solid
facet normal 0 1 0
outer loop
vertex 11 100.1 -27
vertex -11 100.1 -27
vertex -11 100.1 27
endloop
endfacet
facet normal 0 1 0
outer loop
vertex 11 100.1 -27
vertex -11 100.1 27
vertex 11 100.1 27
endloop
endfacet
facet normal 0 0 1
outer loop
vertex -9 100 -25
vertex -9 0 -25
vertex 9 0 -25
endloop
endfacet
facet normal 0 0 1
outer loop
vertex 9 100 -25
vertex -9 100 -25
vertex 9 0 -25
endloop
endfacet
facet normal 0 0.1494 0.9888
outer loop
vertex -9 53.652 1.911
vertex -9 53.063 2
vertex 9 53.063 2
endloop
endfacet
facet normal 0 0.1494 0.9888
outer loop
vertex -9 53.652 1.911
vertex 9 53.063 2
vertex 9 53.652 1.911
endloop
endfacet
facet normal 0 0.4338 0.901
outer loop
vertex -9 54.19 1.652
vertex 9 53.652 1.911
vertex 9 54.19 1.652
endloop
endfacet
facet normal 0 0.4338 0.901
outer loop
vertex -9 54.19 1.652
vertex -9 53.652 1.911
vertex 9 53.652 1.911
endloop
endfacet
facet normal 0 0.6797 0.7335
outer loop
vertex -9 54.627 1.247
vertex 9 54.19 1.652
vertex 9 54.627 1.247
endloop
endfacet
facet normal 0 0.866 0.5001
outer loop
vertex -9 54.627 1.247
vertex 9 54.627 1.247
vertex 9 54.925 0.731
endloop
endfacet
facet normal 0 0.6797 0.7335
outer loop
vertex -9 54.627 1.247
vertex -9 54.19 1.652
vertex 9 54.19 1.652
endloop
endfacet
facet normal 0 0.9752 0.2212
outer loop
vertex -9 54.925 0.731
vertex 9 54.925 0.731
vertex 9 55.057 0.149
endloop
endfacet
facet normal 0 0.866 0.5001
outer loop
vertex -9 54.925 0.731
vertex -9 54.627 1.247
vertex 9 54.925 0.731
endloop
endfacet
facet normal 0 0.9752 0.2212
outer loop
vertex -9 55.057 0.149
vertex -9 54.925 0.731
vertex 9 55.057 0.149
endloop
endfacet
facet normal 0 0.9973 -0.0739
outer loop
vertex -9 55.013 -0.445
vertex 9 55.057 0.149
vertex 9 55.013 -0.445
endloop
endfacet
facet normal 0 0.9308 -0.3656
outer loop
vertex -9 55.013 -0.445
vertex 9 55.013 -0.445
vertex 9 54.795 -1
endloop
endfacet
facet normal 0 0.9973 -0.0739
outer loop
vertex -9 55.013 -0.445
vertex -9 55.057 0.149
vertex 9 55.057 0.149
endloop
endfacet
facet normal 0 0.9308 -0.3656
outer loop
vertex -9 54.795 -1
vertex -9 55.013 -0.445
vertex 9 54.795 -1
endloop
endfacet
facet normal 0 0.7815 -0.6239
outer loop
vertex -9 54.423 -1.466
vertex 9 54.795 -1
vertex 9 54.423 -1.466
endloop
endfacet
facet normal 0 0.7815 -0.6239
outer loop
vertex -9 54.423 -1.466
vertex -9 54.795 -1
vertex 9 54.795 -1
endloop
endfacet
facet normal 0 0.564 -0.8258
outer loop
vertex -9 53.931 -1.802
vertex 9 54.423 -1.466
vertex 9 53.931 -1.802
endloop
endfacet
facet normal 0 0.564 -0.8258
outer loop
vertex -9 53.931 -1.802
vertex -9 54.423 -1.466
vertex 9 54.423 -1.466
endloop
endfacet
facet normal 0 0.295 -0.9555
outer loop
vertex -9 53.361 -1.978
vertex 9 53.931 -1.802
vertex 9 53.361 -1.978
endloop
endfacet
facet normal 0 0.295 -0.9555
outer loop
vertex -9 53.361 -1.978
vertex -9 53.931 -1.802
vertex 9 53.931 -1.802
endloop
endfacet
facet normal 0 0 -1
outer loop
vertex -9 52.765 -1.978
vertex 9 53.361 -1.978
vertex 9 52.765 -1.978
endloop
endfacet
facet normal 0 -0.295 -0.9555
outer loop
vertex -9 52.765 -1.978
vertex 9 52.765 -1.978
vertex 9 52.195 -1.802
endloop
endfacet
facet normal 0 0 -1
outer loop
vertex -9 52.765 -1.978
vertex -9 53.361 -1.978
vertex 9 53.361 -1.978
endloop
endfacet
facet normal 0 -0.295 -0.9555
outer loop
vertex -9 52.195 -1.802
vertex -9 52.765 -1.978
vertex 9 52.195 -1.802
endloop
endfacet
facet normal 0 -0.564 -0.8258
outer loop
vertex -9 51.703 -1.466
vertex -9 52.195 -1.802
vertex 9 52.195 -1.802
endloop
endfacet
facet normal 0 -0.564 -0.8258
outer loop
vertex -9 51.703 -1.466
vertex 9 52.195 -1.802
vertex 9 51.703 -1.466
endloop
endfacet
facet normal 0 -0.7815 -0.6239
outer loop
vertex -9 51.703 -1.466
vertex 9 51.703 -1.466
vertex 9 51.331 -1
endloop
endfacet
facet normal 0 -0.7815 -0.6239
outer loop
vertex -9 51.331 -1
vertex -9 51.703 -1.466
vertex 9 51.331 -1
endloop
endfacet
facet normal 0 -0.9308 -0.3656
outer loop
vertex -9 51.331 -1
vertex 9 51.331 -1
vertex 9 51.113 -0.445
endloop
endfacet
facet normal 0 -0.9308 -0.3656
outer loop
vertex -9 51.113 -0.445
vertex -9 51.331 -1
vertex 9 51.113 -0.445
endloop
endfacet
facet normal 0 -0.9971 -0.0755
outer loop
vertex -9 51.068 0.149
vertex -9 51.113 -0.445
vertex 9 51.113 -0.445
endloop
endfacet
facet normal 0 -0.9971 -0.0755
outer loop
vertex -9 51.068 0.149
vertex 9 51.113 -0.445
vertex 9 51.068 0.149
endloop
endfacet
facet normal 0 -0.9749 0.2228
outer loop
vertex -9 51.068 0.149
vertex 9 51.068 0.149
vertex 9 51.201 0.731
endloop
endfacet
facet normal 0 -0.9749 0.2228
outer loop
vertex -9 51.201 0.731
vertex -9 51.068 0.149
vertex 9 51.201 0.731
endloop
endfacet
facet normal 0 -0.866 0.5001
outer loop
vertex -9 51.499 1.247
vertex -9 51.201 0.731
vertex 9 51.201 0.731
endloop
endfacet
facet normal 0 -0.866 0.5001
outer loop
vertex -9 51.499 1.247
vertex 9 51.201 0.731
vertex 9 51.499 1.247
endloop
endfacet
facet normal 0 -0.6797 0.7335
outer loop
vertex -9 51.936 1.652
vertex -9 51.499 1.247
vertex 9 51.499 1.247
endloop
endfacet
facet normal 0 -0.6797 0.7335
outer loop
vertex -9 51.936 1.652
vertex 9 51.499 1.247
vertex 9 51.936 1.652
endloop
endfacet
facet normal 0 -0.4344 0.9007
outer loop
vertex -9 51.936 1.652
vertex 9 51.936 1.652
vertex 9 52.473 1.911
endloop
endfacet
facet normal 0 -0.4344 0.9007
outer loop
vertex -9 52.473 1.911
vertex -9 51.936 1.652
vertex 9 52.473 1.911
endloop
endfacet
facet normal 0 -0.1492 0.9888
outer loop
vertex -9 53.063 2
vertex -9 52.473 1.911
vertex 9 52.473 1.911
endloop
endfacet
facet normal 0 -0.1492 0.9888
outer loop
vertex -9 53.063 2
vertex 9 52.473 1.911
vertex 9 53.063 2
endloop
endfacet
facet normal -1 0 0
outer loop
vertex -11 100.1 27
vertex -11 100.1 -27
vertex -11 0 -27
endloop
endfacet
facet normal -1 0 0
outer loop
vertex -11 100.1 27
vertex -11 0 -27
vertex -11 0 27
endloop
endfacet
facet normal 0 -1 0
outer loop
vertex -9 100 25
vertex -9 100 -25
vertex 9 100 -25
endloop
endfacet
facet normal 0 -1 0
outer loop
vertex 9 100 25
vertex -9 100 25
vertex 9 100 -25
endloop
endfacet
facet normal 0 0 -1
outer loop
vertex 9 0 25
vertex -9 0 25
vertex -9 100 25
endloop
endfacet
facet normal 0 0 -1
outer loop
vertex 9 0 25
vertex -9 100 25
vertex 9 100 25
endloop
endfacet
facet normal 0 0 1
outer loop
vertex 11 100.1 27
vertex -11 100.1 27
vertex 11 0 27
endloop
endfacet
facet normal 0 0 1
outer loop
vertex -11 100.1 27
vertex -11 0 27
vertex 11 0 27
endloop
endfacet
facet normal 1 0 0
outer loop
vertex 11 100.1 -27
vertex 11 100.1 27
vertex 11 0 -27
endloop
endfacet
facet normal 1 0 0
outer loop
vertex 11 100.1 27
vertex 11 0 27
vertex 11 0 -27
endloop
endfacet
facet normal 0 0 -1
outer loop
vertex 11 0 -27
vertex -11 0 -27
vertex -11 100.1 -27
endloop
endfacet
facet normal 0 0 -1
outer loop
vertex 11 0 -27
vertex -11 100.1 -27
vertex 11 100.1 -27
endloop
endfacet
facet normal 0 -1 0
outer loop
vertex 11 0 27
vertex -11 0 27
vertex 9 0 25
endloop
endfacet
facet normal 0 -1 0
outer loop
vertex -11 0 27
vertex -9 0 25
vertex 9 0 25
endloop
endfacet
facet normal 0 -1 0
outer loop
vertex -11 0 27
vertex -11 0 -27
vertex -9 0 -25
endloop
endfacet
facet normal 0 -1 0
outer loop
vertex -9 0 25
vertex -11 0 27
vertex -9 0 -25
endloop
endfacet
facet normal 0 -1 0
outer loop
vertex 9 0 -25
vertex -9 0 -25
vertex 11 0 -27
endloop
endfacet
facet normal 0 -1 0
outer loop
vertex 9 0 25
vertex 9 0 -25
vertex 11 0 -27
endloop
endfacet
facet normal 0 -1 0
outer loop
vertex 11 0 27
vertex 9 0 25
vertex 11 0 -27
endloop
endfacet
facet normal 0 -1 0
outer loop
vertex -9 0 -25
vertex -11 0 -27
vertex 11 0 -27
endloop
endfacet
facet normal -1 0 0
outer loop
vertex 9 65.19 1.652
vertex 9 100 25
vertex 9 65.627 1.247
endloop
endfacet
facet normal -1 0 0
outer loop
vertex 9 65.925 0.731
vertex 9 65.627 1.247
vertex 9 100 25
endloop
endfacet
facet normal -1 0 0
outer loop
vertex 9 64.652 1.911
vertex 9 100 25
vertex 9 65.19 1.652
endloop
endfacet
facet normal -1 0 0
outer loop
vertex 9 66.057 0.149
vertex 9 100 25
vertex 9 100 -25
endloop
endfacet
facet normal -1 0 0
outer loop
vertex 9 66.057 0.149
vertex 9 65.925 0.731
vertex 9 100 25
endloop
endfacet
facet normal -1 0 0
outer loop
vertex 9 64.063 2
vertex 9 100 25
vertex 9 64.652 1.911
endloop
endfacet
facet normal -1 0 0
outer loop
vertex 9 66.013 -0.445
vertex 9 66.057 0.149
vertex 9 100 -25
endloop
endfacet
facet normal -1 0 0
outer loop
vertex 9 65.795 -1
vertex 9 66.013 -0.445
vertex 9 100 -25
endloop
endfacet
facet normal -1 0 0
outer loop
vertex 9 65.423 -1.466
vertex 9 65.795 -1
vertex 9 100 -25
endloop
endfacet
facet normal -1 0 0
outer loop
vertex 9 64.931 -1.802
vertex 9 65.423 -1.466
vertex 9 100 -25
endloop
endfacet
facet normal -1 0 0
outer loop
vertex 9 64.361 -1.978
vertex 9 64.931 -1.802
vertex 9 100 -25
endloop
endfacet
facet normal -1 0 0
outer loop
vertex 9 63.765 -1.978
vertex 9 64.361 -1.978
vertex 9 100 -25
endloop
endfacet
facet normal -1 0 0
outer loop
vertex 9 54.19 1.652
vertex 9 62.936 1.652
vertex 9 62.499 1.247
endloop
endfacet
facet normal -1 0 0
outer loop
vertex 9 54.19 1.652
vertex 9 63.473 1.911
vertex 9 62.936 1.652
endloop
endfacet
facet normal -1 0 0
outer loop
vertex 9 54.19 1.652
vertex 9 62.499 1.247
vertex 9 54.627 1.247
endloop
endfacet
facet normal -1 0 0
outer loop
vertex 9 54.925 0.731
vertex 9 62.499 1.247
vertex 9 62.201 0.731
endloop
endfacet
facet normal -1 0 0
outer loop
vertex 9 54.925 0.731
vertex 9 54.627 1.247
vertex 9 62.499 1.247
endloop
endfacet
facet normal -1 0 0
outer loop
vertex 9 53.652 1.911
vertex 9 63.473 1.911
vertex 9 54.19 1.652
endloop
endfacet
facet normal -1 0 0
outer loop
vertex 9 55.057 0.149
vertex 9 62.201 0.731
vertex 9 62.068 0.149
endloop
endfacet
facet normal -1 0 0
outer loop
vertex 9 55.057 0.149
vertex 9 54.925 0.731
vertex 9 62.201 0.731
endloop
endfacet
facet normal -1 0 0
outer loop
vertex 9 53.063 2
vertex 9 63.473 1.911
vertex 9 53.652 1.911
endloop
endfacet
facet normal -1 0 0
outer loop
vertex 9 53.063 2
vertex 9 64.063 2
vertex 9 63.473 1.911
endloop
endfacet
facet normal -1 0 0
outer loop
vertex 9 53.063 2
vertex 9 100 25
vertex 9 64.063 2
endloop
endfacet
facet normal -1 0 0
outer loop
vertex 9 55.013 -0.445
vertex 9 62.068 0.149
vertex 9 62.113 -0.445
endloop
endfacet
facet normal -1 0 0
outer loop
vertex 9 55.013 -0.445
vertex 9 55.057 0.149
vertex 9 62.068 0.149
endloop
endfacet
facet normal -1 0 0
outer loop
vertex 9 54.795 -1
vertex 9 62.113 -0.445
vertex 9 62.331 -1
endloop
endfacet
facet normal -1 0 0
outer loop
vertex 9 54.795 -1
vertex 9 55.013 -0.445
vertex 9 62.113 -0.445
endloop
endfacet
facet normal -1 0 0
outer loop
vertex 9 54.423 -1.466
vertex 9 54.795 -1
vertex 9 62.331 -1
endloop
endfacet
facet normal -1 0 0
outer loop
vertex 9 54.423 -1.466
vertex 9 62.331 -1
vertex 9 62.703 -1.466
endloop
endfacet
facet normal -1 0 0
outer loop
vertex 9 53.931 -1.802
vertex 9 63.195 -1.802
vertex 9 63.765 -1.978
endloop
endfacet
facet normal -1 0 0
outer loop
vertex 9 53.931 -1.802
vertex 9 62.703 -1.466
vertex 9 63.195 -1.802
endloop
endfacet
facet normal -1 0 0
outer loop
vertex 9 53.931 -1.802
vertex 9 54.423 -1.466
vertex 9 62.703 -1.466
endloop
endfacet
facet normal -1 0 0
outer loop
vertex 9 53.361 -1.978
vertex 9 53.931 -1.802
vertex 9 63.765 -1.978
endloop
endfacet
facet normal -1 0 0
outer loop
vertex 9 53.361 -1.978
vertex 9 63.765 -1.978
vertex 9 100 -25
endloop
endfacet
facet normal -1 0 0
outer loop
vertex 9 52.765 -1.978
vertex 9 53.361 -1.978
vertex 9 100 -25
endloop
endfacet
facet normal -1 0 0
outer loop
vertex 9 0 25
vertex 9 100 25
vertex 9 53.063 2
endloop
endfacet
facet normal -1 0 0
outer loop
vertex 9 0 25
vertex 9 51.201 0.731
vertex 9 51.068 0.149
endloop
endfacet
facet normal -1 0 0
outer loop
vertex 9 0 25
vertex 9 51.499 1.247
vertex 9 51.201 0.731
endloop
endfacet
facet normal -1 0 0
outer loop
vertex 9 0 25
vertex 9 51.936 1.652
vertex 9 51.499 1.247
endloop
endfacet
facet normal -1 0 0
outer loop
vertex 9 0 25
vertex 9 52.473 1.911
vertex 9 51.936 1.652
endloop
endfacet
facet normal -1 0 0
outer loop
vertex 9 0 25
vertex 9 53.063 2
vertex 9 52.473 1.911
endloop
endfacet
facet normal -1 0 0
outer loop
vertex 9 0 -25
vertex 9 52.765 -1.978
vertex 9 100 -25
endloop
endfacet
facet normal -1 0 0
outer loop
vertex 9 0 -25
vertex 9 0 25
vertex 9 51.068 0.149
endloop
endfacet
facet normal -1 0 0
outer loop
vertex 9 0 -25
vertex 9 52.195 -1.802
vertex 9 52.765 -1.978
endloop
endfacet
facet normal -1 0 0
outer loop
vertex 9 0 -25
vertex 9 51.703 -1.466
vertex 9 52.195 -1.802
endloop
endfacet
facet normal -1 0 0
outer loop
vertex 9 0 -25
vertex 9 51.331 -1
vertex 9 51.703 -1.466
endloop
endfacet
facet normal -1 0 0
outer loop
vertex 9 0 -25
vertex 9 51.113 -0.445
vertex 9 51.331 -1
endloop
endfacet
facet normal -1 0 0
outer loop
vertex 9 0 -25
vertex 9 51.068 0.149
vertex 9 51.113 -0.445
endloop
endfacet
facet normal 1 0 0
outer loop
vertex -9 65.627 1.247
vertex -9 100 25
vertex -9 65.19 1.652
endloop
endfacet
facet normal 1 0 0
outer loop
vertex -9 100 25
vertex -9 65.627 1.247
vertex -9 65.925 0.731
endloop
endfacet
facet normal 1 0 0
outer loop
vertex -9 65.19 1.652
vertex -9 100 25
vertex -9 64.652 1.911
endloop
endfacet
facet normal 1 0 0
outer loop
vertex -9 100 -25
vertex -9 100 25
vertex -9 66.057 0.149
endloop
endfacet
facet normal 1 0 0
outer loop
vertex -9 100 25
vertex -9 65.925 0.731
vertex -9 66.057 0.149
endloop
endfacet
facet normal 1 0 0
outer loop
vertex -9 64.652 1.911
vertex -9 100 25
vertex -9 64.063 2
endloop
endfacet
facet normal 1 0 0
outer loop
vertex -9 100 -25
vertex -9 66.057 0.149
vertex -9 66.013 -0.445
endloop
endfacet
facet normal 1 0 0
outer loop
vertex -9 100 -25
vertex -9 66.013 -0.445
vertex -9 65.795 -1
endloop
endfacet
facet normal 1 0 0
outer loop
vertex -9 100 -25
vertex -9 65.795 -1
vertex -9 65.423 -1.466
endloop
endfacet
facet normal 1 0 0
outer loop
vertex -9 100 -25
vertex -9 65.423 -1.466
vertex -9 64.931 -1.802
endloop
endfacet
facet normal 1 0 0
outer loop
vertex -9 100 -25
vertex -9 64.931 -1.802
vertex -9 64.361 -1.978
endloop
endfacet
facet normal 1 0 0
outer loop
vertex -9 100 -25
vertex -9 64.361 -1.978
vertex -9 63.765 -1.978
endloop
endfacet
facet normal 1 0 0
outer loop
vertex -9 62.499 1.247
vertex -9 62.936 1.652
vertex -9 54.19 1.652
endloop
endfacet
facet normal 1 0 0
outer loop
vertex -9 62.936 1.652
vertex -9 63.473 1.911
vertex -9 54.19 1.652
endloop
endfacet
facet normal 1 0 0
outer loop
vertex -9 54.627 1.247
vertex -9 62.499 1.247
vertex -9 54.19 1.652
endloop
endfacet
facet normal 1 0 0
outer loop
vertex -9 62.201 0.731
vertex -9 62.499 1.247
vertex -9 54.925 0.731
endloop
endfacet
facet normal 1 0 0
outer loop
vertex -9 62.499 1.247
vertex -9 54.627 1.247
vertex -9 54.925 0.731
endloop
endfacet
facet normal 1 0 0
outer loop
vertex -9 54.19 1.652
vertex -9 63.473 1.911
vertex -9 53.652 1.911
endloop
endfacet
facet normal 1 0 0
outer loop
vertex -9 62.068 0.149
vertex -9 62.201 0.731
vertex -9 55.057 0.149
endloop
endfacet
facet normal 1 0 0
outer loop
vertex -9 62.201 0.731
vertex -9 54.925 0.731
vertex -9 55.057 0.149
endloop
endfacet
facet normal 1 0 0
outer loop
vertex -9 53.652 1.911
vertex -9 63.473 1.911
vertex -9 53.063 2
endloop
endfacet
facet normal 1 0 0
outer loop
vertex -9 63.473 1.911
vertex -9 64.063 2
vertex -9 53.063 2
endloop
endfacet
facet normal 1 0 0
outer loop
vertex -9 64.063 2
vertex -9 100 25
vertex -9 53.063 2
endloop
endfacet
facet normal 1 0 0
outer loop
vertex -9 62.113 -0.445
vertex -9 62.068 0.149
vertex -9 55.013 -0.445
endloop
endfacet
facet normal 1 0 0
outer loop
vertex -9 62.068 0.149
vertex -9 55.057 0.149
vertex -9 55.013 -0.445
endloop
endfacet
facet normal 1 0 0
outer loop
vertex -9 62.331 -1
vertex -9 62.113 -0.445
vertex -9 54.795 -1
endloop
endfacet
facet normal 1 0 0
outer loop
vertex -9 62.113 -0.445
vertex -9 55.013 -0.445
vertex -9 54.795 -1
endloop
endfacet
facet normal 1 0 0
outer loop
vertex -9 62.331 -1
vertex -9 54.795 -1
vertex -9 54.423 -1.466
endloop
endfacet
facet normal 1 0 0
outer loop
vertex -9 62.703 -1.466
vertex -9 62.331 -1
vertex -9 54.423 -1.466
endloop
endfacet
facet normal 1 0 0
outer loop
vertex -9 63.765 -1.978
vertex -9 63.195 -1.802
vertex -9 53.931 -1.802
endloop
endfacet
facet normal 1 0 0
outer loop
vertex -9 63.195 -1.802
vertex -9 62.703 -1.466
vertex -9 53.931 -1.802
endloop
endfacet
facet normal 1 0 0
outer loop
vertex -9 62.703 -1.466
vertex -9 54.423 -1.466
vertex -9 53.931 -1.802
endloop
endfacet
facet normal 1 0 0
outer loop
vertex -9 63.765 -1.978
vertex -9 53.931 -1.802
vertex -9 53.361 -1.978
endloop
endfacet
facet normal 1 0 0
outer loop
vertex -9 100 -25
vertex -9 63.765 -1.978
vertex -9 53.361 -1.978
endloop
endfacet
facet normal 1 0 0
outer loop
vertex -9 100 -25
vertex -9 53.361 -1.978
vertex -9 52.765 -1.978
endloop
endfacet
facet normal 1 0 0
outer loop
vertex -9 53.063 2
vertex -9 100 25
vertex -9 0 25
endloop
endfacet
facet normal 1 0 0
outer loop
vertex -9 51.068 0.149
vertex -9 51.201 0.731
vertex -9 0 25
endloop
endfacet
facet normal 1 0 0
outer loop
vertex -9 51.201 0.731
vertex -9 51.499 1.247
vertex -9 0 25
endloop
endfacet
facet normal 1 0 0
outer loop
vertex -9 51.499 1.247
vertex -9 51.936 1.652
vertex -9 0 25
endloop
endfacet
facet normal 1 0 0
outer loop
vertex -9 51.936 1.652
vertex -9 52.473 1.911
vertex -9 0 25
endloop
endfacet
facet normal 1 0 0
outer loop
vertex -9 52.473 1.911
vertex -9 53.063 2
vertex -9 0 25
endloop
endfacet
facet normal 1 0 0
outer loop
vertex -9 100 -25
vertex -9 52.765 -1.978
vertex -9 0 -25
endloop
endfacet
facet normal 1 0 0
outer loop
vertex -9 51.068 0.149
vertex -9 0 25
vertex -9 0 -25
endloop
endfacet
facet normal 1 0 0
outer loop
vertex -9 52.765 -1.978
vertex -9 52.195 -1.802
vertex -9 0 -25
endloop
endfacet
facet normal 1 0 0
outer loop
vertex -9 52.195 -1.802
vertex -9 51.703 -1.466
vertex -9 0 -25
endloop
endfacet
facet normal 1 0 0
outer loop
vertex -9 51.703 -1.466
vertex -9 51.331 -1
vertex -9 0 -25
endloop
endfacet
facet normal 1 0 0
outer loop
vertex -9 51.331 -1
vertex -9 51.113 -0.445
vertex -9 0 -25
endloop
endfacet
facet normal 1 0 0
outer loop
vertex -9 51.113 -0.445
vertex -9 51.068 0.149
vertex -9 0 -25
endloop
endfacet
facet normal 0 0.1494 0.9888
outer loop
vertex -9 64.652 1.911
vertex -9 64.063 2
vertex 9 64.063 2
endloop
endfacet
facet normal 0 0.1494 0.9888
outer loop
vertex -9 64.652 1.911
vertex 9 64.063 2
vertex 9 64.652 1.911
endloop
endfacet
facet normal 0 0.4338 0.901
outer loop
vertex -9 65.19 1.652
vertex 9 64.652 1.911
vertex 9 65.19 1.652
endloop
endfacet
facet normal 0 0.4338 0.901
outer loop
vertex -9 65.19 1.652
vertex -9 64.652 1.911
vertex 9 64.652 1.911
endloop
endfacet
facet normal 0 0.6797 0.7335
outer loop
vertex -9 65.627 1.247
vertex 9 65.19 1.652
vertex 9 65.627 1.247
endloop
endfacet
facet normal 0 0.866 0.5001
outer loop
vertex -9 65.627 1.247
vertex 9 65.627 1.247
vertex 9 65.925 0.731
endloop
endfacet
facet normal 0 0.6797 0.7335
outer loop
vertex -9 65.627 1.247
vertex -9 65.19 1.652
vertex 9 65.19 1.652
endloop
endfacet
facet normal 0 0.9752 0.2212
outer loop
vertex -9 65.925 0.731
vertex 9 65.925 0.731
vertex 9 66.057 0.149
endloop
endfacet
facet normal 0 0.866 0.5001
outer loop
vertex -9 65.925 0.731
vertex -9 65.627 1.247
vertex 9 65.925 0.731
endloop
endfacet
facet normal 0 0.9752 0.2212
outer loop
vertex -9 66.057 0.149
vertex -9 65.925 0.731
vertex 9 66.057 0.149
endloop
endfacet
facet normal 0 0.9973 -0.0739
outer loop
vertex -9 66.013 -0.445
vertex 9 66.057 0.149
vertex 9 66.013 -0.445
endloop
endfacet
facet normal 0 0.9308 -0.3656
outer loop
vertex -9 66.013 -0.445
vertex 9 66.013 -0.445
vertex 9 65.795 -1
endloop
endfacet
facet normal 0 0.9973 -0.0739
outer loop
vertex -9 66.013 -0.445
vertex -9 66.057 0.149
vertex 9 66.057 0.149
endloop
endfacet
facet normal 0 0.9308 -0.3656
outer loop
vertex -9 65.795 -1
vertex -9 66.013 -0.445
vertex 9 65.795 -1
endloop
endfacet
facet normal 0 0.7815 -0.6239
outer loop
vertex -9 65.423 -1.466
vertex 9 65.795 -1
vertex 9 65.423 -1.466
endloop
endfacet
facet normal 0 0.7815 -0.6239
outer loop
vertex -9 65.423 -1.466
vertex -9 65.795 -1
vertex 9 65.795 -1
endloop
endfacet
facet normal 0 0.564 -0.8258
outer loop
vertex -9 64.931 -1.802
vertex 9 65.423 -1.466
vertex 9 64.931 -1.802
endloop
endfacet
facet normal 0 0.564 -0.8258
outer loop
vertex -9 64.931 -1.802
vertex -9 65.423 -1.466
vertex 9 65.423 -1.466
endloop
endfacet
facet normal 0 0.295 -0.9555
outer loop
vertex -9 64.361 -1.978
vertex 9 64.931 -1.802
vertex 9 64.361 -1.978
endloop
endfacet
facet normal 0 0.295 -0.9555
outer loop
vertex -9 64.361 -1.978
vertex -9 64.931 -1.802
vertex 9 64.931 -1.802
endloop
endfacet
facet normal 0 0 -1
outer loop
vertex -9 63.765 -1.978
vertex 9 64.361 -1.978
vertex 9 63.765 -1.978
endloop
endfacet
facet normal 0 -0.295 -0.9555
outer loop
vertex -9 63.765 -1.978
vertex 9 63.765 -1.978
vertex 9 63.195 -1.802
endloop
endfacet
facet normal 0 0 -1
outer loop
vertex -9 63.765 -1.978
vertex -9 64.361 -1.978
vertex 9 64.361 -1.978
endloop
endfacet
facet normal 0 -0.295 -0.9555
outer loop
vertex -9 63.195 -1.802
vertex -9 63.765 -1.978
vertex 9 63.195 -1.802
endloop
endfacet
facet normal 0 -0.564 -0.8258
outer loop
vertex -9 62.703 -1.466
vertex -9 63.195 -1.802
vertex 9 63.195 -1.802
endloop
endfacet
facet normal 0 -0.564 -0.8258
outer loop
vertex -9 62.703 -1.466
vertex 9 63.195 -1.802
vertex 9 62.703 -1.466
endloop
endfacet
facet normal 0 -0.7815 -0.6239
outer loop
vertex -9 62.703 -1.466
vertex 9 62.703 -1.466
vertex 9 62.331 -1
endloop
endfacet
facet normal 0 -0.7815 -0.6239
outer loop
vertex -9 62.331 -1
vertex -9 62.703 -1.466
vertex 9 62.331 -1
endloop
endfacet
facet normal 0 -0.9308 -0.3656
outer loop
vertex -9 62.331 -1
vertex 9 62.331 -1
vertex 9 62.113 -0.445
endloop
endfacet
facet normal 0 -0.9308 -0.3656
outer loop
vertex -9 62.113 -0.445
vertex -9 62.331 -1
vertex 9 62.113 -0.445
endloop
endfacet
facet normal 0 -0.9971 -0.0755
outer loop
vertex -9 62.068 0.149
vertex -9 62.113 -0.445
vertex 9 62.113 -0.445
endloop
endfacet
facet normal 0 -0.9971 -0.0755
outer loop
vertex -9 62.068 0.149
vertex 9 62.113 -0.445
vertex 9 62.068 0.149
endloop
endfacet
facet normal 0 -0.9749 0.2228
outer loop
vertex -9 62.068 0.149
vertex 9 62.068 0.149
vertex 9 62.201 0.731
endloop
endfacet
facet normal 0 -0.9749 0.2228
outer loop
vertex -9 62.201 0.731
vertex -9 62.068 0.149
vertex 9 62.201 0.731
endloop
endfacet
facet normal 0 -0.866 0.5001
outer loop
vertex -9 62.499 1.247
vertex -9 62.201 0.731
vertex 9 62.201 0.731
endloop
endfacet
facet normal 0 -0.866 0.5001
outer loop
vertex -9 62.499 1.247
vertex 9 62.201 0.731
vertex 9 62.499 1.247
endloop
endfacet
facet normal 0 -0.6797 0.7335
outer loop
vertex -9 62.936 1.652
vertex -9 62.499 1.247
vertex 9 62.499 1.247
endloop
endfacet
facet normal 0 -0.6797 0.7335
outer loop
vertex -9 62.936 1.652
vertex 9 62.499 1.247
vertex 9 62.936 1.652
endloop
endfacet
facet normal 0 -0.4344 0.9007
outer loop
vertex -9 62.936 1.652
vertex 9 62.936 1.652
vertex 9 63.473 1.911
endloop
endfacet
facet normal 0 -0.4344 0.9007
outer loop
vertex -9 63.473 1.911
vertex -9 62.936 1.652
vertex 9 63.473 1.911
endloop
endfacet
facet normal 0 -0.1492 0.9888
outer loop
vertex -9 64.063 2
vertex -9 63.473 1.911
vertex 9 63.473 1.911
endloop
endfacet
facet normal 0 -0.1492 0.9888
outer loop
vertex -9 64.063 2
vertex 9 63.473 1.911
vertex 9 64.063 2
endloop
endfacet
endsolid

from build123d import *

# Parameters (mm, degrees)
SKETCH_1_W      = 22
SKETCH_1_H      = 54
SKETCH_1_W_2    = 18
SKETCH_1_H_2    = 50
EXTRUDE_1_DEPTH = 100
SKETCH_2_W      = 22
SKETCH_2_H      = 54
EXTRUDE_2_DEPTH = 0.1
SKETCH_3_R      = 2
EXTRUDE_3_DEPTH = 22


with BuildPart() as part:
    # 草图1 → 凸台-拉伸1 (new body)
    with BuildSketch(Plane(origin=(0, 0, 0), x_dir=(1, 0, 0), z_dir=(0, 1, 0))):
        Rectangle(SKETCH_1_W, SKETCH_1_H)
        Rectangle(SKETCH_1_W_2, SKETCH_1_H_2, mode=Mode.SUBTRACT)
    extrude(amount=EXTRUDE_1_DEPTH)

    # 草图2 → 凸台-拉伸2 (add)
    with BuildSketch(Plane(origin=(0, 100, 0), x_dir=(1, 0, 0), z_dir=(0, 1, 0))):
        Rectangle(SKETCH_2_W, SKETCH_2_H)
    extrude(amount=EXTRUDE_2_DEPTH)

    # 草图3 → 凸台-拉伸3 (add)
    with BuildSketch(Plane.ZY.offset(11)):
        with Locations((0, 64.062893105)):
            Circle(SKETCH_3_R)
        with Locations((0, 53.062893105)):
            Circle(SKETCH_3_R)
    extrude(amount=-EXTRUDE_3_DEPTH)


solid = part.part
